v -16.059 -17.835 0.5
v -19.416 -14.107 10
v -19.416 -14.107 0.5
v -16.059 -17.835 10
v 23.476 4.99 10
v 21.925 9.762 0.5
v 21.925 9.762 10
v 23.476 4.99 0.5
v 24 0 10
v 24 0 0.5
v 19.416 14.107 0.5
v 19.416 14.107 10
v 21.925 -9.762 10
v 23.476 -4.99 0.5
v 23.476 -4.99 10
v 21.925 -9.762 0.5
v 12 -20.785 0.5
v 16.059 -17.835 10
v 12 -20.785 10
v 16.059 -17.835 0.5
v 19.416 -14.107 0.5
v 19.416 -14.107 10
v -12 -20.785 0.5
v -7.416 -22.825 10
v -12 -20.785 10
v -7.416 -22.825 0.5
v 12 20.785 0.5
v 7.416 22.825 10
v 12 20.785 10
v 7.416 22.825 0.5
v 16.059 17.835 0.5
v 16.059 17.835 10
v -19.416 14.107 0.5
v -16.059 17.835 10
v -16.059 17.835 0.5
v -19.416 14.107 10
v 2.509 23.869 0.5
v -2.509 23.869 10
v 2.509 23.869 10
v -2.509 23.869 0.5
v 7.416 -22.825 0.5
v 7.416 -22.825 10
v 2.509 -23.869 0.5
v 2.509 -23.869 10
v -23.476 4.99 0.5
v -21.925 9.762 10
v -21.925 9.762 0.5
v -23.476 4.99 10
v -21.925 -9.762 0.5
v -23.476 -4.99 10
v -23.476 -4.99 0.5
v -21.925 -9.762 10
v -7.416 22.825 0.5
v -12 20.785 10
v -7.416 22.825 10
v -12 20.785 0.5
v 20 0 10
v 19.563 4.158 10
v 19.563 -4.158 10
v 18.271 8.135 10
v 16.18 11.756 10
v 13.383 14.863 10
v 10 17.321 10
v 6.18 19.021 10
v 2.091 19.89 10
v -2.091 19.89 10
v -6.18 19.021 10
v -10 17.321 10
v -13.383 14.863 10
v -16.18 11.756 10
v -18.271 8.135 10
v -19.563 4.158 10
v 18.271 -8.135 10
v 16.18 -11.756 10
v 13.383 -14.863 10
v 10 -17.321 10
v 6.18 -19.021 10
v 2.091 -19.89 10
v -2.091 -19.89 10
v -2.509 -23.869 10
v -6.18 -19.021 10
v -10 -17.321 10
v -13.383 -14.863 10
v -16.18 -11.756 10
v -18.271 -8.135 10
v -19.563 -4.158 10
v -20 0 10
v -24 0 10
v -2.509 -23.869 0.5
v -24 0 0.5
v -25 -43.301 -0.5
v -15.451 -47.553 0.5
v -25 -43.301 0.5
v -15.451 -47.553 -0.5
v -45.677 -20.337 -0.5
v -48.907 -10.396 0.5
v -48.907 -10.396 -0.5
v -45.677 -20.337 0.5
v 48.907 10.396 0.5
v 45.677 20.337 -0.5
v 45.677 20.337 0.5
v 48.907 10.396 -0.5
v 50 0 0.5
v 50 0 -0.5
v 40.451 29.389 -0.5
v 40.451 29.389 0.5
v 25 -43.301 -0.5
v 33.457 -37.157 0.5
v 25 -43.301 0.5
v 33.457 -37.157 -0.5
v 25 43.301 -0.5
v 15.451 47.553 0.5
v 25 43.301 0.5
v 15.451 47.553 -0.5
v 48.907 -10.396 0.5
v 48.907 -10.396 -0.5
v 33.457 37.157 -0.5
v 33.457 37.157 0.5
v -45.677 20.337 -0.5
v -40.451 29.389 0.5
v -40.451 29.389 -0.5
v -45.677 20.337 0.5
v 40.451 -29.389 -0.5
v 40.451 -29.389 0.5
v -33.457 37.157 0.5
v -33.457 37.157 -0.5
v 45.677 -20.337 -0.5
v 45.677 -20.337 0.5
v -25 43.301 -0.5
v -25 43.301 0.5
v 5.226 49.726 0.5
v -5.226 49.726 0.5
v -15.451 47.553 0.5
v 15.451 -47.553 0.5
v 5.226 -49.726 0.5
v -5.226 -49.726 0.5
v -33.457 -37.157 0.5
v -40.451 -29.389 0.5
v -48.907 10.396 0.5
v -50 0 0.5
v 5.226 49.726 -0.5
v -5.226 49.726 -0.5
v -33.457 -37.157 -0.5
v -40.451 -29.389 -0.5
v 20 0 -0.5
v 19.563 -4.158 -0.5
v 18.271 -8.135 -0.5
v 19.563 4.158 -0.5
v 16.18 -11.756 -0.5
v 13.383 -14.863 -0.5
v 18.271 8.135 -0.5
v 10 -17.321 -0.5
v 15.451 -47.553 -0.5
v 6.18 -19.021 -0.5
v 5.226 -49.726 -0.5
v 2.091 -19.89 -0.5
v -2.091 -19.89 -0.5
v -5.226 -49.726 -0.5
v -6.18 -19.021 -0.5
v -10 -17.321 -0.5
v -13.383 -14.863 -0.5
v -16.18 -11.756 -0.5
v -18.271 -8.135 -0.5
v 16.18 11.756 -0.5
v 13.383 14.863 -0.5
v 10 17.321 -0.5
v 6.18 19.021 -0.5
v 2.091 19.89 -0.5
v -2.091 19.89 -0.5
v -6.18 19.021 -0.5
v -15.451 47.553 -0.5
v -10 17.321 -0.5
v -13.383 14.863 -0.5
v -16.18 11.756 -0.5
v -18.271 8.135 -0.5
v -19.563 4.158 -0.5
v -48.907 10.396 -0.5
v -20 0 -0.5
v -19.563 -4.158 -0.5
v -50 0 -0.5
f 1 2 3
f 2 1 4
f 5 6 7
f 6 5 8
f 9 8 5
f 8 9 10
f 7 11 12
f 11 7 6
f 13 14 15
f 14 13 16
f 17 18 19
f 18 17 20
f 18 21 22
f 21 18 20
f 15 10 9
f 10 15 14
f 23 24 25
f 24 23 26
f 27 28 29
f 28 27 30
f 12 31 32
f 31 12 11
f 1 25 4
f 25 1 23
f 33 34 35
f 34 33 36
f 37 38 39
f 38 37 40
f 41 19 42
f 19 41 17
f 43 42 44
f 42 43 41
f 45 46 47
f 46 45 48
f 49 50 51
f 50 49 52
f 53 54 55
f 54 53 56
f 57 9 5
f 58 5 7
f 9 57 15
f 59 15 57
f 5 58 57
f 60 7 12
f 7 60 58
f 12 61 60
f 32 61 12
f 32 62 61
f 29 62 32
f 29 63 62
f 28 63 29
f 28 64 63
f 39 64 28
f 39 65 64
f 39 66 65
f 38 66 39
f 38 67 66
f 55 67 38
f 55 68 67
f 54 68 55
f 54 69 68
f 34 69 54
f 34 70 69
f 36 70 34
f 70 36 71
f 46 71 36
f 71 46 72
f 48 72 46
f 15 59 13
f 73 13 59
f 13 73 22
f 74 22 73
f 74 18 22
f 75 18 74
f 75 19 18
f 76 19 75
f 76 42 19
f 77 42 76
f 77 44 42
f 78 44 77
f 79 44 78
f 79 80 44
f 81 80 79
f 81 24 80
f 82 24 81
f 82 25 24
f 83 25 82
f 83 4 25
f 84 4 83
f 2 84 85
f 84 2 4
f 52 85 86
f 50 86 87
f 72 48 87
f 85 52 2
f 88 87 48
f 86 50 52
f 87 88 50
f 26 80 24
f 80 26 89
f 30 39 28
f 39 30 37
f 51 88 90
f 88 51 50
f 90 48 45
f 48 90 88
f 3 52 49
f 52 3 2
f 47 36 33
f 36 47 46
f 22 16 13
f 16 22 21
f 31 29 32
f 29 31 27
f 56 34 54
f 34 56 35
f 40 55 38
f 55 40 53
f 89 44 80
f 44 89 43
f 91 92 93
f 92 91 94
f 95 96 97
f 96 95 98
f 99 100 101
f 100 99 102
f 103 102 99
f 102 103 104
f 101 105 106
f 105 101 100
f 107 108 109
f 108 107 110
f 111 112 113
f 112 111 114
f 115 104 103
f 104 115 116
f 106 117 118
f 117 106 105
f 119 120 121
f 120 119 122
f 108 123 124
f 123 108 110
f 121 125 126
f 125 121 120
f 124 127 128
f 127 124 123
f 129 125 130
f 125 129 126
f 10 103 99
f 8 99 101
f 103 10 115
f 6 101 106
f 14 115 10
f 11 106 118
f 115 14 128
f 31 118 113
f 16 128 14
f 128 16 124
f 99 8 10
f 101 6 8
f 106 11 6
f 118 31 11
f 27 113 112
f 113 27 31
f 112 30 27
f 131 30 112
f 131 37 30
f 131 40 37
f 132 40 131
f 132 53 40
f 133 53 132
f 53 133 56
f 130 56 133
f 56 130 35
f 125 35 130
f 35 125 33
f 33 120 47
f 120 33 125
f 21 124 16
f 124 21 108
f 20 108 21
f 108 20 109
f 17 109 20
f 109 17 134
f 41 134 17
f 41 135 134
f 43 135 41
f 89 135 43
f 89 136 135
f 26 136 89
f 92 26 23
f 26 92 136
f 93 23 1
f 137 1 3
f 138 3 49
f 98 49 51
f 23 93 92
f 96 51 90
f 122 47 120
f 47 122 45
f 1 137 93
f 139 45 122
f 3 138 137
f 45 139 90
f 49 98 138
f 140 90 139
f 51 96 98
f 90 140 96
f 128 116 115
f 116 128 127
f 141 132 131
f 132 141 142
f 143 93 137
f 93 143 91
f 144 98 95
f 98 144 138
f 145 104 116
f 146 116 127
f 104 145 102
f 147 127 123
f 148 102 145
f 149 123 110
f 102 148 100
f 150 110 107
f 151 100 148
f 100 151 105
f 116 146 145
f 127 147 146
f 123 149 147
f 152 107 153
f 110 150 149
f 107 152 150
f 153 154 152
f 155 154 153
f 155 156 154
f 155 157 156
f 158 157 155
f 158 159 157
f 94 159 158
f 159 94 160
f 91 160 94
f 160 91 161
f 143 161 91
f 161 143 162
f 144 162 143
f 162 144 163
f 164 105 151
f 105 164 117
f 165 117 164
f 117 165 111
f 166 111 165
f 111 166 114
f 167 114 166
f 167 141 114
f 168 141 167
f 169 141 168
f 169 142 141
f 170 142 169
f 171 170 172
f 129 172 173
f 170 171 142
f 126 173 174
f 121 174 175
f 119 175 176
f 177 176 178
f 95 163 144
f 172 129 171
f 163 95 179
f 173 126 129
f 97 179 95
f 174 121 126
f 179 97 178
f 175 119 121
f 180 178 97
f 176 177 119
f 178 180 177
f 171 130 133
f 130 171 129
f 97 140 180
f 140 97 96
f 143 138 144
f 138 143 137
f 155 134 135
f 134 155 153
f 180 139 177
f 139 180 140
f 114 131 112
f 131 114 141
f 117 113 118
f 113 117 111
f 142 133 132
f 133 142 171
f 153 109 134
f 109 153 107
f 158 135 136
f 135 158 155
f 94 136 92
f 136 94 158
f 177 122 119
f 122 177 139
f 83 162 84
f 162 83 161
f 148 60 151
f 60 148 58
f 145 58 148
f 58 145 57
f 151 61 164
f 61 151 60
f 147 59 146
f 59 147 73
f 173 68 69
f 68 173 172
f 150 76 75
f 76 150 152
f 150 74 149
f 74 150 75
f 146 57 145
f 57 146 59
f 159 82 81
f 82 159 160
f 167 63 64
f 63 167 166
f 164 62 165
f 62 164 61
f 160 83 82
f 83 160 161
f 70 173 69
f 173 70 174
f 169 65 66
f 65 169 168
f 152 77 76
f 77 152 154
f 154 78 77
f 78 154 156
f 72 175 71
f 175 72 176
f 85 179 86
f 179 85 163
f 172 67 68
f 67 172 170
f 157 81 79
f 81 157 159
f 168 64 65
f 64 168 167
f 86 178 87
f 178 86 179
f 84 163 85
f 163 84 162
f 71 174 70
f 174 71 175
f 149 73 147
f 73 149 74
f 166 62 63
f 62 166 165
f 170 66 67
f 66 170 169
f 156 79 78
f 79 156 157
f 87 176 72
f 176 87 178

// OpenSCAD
translate(v = [0, 0, 0]) {
	difference() {
		union() {
			cylinder(h = 10.0000000000, r = 24.0000000000);
			cylinder(h = 1, r = 50, center = true);
		}
		cylinder(h = 20.0000000000, r = 20.0000000000, center = true);
	}
}
/***********************************************
******      SolidPython code:      *************
************************************************
 
from solid import *
from solid.utils import *
import doctest

from math import sqrt

from metrics import *
from units import *
from core import *




        
class Plate( Element ):
    def create_plate( self ):
        return cube( self.size() )

    def create( self ):
        return create_plate()

class PerforatedPlate( Plate ):
    def __init__( self, size, hole_radius=None ):
        Plate.__init__( self, size )
        self.hole_radius = hole_radius if hole_radius else 1.0

    def create_hole( self, radius=None, depth=None ):
        depth = depth if depth else self.size.z
        radius = self.hole_radius
        return cylinder( radius, depth)

    def create( self, position=None ):
        return difference() (
            # the solid part
            self.create_plate(),
            # the hole through the solid part
            # translated to the center of x/y-axes
            translate( [self.size.center('x'), self.size.center('y'), 0] ) (
                self.create_hole()
            )
        )


class PerforatedRoundedPlate( PerforatedPlate ):
    def __init__( self, size, hole_radius=None ):
        PerforatedPlate.__init__( self, size, hole_radius )
    
    def create_plate( self, reverse=False ):    
        depth =  self.size.z
        radius = self.size.center('y')
        
        result = difference() (
            cube( self.size() ),
            translate( [self.size.half('x'), 0, 0] ) (
                cube( [ self.size.x, self.size.y, self.size.z ] )
            )
        )
        
        return union() (
            result,
            translate( [self.size.half('x'), self.size.half('y'), 0] ) (
                cylinder( radius, depth )
            )
        )    


class PerforatedSection( Element ):
    def __init__( self, length=10, unit=20, hole_radius=5 ):
        # the length is calculated from the center of 
        # the center of the opposite hole
        self.length = length - unit # (lenght - 2 * (unit/2))
        self.unit = unit
        self.e1 = PerforatedRoundedPlate( Size( unit, unit, 1 ), hole_radius )
        self.e2 = PerforatedRoundedPlate( Size( unit, unit, 1 ), hole_radius )
        
    def create_bridge( self ):
        return translate([-self.length,0,0]) (
            cube([self.length, self.unit, 1])
        )
    
    def create( self, position=None ):        
        bridge = self.create_bridge()
    
        ends = union() (
            translate([-self.length,0,0]) (
                mirror([-1,0,0]) (self.e1.put())
            ),
            self.e2.put(),            
        )
        
        return union() (
            ends, 
            bridge
        )

    
class Grill(Element):
    def create_grill( self ):

        holes = []

        # parameterize
        width = 2
        step = width * 2

        for i in range( -1, self.size.x * 2, step ):
            holes.append(
                translate([i,-2,0]) (
                    rotate( 45 ) (
                        cube( [width, self.size.diagonal() * 2,self.size.z] )
                    )
                )
            )

        holes = union() (
            *holes
        )

        return holes

    def create( self ):
        return difference() (
            cube( self.size() ),
            self.create_grill()
        )


class Mesh( Grill ):
    def create( self ):
        grill_a = Grill( self.size )
        grill_b = Grill( self.size )

        grill_b = mirror([-1,0,0]) (
            grill_b.put([-self.size.x, 0, 0])
        )

        return union() (
            color("Blue") ( grill_a.put() ),
            color("Red") ( grill_b )
        )


class MeshRow(Element):
    def create( self ):
        pass


    
class HoleGrill(Grill):
    
    def create_hole( self, radius=1 ):
        return cylinder( radius, self.size.z )
    
    def find_holes( self, step=5 ):
        result = []
        odd = False
    
        x = self.size.x
        y = self.size.y
        z = self.size.z
        
        v = {}
    
        v['x'] = [i for i in range( 1, x, step )]
        v['y'] = [i for i in range( 1, y, step )]
        
        for d in range( -x, x+1, 2 ):
            odd = not odd
            for x, y in zip( v['x'], v['y'] ):
                if odd:
                    result.append( [x+d, y+step, 0] )
                else:
                    result.append( [x+d, y, 0] )
        
        return result
                
                
        
        
    def create( self ):
    
        g = cube( self.size() )
    
        holes = []
        
        for h in self.find_holes():
            h = translate(h) (
                self.create_hole()
            )        
            holes.append( h )

        holes = union() ( *holes )
        
        g = difference() (
            g,
            holes
        )   
        
        return g

        
        
class LineGrill( Grill ):
    pass


class MeshBox(Element):
    def create( self ):

        c = cube( [self.size.x, self.size.y, 1] )
        holes = []

        x_points = partition( self.size.x, 21 )[1:]
        y_points = partition( self.size.y, 3 )[1:]

        x_median = x_points[len(x_points) // 2]
        y_median = y_points[len(y_points) // 2]



        x_median_delta = x_median - self.size.half('x')
        y_median_delta = y_median - self.size.half('y')

        for i in x_points:
            for k in y_points:
                holes.append(
                    translate([i-x_median_delta, k-y_median_delta, 0]) (
                        cube( [1,1,1], center=True )
                    )
                )

        holes = union() ( *holes )

        return difference() (
            c,
            holes
        )


class Roller( Element ):
    def create( self ):

        wall_thickness = self.parameters['wall_thickness']
        wall_height = self.parameters['wall_height']
        hole_diameter = self.parameters['hole_diameter']

        circle = cylinder( self.size.x, self.size.z, center=True )
        hole = cylinder( hole_diameter, wall_height * 2, center=True )

        wall = cylinder( (wall_thickness * 2) + hole_diameter, wall_height )

        result = difference() (
            union() (
                wall,
                circle
            ),
            hole
        )

        return result


        
if __name__ == "__main__":

    e = MeshBox( Size(45, 5, 1) )
    e = Roller( Size( 50, 50, 1 ), parameters={
        'hole_diameter': 20.0,
        'wall_thickness': 2.0,
        'wall_height': 10.0
    })
    e.create()

    scad_render_to_file( e.put(), "project.scad" )
 
 
***********************************************/
                            
